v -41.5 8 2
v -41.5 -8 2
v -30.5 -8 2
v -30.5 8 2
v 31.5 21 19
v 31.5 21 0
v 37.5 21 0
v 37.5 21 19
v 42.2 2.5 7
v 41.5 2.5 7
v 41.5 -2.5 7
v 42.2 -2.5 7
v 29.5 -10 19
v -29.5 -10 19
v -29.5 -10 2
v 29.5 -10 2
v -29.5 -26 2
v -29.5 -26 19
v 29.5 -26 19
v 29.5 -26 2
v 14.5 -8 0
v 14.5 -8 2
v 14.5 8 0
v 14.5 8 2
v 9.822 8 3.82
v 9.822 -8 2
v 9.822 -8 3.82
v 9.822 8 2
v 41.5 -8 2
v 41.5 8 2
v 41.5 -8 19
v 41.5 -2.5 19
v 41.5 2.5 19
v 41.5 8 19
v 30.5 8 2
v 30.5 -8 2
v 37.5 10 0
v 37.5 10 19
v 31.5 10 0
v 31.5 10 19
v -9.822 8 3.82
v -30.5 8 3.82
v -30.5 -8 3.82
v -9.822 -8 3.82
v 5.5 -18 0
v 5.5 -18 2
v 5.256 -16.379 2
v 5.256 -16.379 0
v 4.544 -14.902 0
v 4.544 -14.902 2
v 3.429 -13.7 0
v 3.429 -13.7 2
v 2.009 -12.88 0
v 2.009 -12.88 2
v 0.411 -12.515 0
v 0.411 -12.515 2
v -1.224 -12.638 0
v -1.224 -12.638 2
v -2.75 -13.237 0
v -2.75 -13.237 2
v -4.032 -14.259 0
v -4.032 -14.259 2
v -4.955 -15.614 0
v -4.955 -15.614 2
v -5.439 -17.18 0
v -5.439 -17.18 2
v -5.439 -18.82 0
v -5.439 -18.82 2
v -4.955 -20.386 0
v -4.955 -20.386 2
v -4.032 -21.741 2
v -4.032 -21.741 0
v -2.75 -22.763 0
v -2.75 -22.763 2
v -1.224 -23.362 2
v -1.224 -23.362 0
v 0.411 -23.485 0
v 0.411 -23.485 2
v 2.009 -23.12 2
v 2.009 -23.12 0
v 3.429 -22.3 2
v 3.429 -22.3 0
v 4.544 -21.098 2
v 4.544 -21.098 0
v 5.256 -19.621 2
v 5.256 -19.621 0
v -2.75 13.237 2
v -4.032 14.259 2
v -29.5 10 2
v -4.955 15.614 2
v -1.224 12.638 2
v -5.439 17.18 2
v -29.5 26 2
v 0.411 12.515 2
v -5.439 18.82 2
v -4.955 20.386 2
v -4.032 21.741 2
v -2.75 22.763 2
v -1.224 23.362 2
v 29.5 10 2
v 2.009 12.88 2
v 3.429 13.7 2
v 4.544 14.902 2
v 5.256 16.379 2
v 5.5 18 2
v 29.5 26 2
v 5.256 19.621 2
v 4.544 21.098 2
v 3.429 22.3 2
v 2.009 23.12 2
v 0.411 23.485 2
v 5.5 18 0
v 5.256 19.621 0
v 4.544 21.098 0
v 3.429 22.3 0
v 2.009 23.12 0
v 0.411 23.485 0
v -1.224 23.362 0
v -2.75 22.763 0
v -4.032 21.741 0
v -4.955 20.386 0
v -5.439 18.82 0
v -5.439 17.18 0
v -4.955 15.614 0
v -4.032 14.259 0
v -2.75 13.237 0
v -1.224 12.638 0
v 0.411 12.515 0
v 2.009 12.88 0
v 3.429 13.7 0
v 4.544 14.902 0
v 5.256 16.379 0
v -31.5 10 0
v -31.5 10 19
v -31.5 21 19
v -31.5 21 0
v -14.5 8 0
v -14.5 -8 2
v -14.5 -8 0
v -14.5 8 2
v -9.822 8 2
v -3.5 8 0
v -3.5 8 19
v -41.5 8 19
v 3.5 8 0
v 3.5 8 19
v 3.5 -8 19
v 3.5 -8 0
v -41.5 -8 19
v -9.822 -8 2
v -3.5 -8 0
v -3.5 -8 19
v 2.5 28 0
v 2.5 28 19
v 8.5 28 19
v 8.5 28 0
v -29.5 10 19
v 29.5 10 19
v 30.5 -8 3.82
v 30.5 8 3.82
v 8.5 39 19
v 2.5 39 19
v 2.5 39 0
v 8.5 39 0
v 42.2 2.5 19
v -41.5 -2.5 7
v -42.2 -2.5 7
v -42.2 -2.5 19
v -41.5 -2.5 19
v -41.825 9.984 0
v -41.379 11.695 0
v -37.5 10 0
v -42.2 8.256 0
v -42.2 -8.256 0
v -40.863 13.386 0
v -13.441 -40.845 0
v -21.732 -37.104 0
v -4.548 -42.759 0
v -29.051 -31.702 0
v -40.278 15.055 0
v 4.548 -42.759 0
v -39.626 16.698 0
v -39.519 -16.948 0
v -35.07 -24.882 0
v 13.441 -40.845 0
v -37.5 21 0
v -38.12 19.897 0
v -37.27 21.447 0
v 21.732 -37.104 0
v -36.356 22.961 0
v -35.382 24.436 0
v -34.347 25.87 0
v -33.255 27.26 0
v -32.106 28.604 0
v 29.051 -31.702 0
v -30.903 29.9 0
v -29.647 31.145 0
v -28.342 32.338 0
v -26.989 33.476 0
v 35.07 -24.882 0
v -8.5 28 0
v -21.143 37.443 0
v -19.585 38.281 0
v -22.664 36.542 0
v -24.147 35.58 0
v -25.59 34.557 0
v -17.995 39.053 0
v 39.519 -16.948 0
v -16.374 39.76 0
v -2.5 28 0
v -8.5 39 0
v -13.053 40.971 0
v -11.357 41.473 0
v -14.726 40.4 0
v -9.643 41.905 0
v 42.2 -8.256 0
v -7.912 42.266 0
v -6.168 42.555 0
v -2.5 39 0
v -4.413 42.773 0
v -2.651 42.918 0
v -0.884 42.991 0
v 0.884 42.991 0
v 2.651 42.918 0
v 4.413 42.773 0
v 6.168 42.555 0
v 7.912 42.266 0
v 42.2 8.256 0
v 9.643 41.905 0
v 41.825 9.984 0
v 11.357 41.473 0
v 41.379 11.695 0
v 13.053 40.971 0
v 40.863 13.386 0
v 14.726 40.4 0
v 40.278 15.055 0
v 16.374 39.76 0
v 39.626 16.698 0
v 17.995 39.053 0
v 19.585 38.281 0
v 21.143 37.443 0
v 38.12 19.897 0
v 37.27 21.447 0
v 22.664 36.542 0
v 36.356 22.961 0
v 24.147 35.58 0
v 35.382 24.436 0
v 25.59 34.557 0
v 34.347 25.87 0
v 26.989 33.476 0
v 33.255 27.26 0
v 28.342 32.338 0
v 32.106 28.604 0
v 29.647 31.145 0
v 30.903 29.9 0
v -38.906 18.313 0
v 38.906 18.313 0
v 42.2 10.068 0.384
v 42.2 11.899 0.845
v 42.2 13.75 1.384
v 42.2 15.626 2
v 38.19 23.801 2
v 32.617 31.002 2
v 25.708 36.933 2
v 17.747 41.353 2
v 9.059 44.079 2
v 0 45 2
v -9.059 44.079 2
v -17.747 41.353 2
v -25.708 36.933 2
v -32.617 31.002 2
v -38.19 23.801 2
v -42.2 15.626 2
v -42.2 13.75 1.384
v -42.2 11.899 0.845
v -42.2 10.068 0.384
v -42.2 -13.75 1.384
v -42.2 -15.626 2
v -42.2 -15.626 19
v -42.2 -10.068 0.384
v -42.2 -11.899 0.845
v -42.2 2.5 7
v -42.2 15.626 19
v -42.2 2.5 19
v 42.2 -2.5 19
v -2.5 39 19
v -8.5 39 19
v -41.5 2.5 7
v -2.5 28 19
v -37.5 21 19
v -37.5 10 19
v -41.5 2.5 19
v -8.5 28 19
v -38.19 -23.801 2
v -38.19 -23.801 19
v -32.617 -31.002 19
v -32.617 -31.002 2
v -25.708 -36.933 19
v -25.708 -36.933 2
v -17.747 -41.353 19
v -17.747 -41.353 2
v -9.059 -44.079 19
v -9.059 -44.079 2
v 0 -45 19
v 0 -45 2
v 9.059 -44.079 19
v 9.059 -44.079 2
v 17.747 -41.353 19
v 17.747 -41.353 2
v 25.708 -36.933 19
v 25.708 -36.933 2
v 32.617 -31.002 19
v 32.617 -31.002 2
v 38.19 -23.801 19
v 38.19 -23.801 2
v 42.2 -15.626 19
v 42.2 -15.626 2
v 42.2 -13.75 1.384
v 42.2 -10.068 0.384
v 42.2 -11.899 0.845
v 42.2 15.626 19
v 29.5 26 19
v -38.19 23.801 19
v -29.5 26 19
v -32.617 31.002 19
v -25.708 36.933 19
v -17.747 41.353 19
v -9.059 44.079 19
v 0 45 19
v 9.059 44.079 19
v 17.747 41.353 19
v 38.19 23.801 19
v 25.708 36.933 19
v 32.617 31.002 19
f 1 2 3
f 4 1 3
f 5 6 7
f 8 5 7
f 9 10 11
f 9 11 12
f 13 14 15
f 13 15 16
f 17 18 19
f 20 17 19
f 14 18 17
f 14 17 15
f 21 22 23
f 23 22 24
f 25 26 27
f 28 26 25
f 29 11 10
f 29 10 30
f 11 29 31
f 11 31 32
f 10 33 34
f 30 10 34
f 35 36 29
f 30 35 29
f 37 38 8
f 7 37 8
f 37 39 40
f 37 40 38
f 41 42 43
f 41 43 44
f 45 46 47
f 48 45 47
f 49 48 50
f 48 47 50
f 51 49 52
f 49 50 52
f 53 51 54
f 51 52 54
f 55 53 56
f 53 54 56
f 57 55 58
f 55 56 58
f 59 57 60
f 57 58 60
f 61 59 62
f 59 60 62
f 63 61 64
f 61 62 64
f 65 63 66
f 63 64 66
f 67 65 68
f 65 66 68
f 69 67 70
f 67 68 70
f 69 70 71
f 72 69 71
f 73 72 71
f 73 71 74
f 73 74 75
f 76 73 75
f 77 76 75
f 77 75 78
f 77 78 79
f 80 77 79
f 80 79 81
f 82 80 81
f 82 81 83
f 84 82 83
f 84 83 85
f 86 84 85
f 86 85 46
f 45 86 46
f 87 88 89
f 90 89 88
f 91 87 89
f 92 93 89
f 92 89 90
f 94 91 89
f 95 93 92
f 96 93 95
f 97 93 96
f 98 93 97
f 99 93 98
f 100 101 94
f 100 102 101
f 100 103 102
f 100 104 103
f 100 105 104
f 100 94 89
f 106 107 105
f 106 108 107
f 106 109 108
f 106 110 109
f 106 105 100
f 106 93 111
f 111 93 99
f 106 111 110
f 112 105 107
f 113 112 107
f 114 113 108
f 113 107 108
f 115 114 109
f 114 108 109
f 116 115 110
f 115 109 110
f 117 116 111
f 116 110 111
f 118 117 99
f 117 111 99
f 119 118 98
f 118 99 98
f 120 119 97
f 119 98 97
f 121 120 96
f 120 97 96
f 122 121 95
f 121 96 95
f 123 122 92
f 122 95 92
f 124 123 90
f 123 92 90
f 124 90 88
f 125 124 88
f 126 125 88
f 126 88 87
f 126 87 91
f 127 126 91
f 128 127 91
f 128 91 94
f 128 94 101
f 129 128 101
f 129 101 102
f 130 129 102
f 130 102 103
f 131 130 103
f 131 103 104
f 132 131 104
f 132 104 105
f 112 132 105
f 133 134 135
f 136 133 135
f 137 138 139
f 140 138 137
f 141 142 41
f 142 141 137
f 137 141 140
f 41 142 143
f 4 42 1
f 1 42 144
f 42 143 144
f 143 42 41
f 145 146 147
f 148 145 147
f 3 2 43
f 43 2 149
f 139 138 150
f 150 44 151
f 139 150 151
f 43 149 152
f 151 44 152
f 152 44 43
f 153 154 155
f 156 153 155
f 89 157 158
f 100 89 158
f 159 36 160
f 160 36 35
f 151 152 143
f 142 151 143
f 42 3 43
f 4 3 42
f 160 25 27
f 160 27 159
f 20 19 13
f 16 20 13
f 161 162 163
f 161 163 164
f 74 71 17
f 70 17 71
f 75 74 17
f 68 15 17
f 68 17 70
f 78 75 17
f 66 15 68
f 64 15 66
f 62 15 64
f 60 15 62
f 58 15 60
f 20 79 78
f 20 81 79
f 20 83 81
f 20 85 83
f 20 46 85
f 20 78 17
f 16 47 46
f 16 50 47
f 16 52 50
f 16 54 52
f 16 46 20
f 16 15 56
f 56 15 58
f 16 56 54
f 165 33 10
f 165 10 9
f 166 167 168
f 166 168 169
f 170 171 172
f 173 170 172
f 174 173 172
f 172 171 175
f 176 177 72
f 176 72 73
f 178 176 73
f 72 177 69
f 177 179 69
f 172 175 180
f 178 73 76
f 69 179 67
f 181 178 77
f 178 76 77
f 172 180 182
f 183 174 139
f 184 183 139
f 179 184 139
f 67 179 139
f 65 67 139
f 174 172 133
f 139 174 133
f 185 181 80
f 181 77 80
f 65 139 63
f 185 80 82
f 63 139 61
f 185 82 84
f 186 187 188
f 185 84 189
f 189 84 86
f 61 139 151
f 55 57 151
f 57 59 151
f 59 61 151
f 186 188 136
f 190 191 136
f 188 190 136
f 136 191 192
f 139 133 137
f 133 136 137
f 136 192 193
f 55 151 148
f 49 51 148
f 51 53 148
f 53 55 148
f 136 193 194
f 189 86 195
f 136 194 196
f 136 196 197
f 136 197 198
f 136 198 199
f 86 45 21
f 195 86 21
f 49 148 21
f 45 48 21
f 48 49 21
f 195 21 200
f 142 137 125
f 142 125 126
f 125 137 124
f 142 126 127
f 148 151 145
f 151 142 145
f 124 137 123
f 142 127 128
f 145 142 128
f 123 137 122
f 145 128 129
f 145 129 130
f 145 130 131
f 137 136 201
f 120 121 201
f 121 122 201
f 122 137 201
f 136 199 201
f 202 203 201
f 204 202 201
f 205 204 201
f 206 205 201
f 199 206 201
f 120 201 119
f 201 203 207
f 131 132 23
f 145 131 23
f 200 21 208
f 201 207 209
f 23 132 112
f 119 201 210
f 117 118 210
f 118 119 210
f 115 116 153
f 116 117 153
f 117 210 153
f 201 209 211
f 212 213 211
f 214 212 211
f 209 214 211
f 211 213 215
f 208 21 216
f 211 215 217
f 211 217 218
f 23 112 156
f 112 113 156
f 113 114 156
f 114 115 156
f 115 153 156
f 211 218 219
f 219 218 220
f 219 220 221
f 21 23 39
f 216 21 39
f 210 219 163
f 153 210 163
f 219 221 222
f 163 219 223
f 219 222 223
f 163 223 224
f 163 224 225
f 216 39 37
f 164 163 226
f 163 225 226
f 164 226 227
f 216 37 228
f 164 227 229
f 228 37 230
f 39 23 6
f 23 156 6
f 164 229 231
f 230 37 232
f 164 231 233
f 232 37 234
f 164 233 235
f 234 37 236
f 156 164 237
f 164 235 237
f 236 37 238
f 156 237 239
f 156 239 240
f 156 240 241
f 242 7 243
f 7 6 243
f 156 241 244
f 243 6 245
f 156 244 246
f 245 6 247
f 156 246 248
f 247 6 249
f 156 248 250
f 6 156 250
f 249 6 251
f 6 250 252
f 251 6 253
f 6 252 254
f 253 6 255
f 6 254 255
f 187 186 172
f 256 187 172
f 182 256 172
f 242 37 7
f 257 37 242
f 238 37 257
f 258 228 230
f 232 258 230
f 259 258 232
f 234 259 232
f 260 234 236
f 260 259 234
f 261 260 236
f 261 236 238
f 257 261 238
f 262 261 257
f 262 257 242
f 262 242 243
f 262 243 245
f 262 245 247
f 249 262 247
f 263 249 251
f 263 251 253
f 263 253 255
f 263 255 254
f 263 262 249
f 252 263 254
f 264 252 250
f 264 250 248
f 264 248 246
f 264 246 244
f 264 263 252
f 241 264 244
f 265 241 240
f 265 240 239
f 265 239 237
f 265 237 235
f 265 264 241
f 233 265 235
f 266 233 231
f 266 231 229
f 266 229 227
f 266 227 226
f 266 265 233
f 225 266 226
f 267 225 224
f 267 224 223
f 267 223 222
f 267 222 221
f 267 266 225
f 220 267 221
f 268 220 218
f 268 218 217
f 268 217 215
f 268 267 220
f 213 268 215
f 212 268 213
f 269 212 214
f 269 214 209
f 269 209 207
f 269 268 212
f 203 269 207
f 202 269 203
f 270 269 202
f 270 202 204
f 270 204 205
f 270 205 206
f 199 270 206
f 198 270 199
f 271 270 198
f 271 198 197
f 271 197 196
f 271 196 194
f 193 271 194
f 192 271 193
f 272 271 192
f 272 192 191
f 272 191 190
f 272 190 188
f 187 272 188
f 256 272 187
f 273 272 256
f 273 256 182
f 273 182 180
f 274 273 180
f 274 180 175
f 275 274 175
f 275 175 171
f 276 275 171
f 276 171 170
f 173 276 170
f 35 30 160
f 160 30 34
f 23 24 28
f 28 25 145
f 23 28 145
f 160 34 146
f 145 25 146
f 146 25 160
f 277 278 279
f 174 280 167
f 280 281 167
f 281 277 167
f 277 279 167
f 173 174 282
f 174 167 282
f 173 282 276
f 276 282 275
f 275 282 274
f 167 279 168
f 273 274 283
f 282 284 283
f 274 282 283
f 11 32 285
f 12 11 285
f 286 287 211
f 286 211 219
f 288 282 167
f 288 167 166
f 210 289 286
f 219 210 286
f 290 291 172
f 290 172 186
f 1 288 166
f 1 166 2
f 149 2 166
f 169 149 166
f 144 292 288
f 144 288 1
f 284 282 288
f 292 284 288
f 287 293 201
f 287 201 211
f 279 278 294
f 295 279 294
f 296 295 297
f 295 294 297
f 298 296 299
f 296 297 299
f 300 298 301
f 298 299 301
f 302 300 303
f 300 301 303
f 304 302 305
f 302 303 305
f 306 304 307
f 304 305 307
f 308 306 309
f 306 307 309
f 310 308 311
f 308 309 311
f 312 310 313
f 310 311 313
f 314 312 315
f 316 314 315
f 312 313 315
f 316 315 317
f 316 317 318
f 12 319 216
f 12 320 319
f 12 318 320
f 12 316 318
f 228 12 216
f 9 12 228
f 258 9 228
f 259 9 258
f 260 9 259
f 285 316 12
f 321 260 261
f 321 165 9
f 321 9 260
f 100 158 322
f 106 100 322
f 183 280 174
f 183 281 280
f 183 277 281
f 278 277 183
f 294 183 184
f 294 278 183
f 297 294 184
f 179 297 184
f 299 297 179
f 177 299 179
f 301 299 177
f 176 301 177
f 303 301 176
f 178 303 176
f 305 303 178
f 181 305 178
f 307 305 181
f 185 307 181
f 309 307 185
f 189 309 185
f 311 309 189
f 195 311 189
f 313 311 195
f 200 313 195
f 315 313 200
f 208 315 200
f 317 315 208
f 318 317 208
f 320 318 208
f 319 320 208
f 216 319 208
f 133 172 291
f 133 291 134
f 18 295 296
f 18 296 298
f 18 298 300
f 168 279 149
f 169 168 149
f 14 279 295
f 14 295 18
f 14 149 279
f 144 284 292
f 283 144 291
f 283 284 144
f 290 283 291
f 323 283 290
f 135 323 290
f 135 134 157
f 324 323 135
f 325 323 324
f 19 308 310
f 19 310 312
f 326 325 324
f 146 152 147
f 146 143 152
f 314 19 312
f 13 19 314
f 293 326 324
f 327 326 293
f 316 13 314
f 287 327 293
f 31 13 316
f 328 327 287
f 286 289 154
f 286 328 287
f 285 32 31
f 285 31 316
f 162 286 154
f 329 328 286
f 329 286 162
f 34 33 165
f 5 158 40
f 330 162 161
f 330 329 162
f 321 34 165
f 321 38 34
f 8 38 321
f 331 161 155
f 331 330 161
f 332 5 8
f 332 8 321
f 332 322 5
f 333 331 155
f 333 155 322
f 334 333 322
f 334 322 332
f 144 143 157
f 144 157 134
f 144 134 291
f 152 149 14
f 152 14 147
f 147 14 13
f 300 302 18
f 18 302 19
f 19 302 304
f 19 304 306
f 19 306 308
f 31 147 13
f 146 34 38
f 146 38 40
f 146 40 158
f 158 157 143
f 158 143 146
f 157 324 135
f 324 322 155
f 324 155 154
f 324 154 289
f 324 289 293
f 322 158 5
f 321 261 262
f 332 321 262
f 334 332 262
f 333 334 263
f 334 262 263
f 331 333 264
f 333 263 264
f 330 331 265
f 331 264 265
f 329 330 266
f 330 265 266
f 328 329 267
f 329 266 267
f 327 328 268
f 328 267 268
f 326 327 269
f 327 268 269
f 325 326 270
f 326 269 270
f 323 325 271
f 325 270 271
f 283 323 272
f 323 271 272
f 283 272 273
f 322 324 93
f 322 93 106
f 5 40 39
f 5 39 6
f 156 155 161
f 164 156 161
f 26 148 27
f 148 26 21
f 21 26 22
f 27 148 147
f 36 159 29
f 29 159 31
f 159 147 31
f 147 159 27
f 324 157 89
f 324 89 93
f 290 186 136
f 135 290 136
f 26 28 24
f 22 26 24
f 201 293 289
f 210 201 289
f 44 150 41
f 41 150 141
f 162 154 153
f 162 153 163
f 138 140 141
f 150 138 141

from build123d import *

# Parameters (mm, degrees)
F0_R     = 45
F1_DEPTH = 19
F2_W     = 7
F2_H     = 5
F2_W_2   = 59
F2_H_2   = 16
F3_DEPTH = 17
F4_W     = 6
F4_H     = 11
F4_W_2   = 11
F4_H_2   = 16
F4_W_3   = 10.7800960541
F4_H_3   = 45.1917052269
F4_R     = 5.5
F5_DEPTH = 19.001
F7_START = -12
F6_W     = 0.7
F6_H     = 5
F7_DEPTH = 5
F8_W     = 20.6779545471
F8_H     = 16
F9_DEPTH = 1.82
F10_SIZE = 2


with BuildPart() as f1:
    # F0 (on Top) → F1 (new body)
    with BuildSketch(Plane.XY):
        Circle(F0_R)
    extrude(amount=F1_DEPTH)

    # F2 (on face) → F3 (cut)
    with BuildSketch(Plane.XY.offset(19)):
        Polygon((41.5, 2.5), (41.5, 8), (3.5, 8), (3.5, -8), (41.5, -8), (41.5, -2.5), align=None)
        with Locations((45, 0)):
            Rectangle(F2_W, F2_H)
        with Locations((0, 18)):
            Rectangle(F2_W_2, F2_H_2)
        with Locations((0, -18)):
            Rectangle(F2_W_2, F2_H_2)
        Polygon((-3.5, 8), (-41.5, 8), (-41.5, 2.5), (-41.5, -2.5), (-41.5, -8), (-3.5, -8), align=None)
        with Locations((-45, 0)):
            Rectangle(F2_W, F2_H)
    extrude(amount=-F3_DEPTH, mode=Mode.SUBTRACT)

    # F4 (on face) → F5 (cut, through all)
    with BuildSketch(Plane.XY.offset(19)):
        with Locations((-34.5, 15.5)):
            Rectangle(F4_W, F4_H)
        with Locations((34.5, 15.5)):
            Rectangle(F4_W, F4_H)
        with Locations((-5.5, 33.5)):
            Rectangle(F4_W, F4_H)
        with Locations((5.5, 33.5)):
            Rectangle(F4_W, F4_H)
        with Locations((-9, 0)):
            Rectangle(F4_W_2, F4_H_2)
        with Locations((9, 0)):
            Rectangle(F4_W_2, F4_H_2)
        with Locations((-47.590048027, 0)):
            Rectangle(F4_W_3, F4_H_3)
        with Locations((47.590048027, 0)):
            Rectangle(F4_W_3, F4_H_3)
        with Locations((0, 18)):
            Circle(F4_R)
        with Locations((0, -18)):
            Circle(F4_R)
    extrude(amount=-F5_DEPTH, mode=Mode.SUBTRACT)

    # F6 (on face) → F7 (join)
    with BuildSketch(Plane.XY.offset(19).offset(F7_START)):
        with Locations((-41.85, 0)):
            Rectangle(F6_W, F6_H)
        with Locations((41.85, 0)):
            Rectangle(F6_W, F6_H)
    extrude(amount=-F7_DEPTH)

    # F8 (on face) → F9 (join)
    with BuildSketch(Plane.XY.offset(2)):
        with Locations((-20.1610227264, 0)):
            Rectangle(F8_W, F8_H)
        with Locations((20.1610227264, 0)):
            Rectangle(F8_W, F8_H)
    extrude(amount=F9_DEPTH)

    # F10
    f10_edges = [f1.edges().sort_by_distance(p)[0] for p in [
        (0, -45, 0),
        (0, 45, 0),
    ]]
    chamfer(f10_edges, length=F10_SIZE)


solid = f1.part
